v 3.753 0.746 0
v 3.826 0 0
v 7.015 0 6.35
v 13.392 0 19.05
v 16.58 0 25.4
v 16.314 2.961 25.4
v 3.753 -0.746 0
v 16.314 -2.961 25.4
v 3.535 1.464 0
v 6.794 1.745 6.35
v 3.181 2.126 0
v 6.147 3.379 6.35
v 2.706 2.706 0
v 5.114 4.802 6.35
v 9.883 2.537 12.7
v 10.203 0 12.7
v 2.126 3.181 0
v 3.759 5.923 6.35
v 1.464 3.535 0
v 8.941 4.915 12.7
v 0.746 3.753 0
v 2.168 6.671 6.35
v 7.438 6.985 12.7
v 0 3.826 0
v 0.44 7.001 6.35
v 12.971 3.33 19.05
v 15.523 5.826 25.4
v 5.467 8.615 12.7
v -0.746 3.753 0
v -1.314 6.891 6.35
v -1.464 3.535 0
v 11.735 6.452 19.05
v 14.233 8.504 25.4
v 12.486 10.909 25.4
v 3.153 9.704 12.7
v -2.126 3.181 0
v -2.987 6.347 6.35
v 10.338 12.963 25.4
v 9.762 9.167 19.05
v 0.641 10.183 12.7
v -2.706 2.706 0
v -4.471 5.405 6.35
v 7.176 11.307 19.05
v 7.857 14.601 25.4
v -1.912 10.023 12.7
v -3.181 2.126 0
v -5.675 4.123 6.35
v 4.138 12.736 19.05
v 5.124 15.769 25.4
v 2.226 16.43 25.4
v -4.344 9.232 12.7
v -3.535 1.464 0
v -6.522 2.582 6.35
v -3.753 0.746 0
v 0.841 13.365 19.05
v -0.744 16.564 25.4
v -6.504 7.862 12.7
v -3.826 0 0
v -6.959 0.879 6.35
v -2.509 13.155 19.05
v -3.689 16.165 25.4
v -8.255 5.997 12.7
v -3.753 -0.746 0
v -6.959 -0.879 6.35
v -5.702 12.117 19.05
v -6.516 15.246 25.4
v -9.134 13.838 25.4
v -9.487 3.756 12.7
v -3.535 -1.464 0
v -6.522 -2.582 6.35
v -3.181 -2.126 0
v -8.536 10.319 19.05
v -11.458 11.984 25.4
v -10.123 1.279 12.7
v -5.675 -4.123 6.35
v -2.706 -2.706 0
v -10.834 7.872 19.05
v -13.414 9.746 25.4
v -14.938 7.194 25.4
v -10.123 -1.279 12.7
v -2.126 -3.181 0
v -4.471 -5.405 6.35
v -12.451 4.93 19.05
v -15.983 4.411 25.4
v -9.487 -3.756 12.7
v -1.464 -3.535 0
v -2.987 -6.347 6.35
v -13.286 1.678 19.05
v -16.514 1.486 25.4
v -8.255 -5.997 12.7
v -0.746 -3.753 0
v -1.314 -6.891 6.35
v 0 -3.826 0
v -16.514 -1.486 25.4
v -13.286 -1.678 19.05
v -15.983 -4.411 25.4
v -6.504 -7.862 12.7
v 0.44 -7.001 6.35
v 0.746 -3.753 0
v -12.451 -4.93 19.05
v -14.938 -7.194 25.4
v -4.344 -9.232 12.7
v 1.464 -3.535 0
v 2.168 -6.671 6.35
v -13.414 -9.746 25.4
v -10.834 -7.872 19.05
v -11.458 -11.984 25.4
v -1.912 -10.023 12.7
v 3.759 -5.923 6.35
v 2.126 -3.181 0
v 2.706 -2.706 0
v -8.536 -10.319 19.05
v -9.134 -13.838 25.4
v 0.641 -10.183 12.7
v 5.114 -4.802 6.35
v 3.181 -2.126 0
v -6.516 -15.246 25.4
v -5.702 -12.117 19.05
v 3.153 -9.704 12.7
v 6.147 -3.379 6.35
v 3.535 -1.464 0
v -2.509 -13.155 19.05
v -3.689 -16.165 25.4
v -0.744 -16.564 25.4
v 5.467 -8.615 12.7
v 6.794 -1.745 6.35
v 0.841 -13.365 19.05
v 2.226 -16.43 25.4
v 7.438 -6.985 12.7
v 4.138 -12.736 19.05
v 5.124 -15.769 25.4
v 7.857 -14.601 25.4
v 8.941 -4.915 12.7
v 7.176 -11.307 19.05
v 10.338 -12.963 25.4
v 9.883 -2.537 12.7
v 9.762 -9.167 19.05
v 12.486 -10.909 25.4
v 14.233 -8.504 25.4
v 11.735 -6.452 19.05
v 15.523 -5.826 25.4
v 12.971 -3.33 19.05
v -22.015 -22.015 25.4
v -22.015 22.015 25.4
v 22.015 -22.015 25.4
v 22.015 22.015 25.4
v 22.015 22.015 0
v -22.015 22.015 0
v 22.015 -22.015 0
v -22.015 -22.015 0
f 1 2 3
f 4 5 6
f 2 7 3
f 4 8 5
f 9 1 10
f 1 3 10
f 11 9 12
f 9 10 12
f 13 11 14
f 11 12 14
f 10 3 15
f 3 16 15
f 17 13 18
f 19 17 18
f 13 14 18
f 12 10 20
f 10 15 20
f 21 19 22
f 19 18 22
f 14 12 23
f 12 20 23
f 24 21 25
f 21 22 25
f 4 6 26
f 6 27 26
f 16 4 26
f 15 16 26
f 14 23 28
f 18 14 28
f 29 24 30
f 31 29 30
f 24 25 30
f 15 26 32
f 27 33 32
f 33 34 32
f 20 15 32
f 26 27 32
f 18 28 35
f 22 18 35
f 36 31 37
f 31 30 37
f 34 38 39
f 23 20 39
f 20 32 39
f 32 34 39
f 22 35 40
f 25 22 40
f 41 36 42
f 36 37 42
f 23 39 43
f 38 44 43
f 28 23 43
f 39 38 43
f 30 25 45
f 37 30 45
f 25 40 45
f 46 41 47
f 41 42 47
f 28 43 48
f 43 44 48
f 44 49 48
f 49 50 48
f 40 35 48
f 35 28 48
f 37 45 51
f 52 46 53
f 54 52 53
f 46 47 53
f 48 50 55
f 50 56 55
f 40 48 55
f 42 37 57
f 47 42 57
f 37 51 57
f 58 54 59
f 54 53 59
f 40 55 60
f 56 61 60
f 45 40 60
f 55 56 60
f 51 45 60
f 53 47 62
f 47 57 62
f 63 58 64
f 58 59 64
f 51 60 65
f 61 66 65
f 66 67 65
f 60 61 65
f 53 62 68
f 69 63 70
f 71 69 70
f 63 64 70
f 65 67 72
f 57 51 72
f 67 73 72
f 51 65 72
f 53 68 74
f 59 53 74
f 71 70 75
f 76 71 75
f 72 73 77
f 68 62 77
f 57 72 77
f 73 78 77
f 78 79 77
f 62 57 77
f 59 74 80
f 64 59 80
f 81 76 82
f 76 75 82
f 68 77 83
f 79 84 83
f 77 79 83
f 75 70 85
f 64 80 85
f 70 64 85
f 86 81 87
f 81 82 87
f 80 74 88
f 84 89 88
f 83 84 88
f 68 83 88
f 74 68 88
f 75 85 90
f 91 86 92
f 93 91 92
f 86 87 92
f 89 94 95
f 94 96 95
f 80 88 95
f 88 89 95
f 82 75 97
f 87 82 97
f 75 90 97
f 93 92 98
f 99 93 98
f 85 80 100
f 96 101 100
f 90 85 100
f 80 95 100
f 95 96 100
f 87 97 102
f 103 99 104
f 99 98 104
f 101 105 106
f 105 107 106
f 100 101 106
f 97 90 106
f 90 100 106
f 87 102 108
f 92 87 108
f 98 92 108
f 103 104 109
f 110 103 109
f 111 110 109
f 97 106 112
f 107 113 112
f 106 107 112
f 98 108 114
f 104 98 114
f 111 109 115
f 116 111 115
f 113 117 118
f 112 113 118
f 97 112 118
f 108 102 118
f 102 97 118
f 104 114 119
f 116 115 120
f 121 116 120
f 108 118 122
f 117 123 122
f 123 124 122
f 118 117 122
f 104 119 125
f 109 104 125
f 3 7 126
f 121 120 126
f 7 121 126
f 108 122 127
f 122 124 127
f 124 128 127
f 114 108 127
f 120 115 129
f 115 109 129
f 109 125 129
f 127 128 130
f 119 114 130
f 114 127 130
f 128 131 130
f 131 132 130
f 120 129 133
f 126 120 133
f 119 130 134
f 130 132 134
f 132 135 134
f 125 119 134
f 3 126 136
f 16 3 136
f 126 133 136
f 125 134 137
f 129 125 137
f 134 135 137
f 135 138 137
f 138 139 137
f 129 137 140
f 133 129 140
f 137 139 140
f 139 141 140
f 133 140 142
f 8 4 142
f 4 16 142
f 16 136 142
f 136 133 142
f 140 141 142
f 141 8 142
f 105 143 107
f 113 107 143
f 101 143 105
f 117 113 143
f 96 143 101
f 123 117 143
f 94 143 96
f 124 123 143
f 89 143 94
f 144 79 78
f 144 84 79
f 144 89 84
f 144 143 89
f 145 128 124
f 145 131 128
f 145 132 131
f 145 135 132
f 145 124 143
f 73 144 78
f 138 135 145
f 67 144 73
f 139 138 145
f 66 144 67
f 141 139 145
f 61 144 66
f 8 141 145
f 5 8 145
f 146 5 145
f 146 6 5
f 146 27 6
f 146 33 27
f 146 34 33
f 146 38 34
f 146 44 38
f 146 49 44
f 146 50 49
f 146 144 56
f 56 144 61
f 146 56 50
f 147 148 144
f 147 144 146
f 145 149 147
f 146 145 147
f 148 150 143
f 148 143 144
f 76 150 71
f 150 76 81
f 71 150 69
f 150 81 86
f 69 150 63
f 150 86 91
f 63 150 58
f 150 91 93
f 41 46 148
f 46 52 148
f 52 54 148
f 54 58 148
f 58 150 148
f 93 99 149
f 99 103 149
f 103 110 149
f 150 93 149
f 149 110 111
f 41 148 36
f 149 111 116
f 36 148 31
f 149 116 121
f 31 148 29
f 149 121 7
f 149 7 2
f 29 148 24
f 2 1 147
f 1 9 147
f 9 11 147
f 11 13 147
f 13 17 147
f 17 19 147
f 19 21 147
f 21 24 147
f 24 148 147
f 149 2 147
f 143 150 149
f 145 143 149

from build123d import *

# Parameters (mm, degrees)
F0_W     = 44.030744
F0_H     = 44.030744
F1_DEPTH = 25.4


with BuildPart() as f1:
    # F0 (on Top) → F1 (new body)
    with BuildSketch(Plane.XY):
        Rectangle(F0_W, F0_H)
    extrude(amount=F1_DEPTH)


with BuildPart() as f3:
    # F2 (on Front) → F3 (revolve)
    with BuildSketch(Plane.XZ):
        Polygon((19.131194, 30.48), (0, 30.48), (0, -7.62), align=None)
    revolve(axis=Axis((0, 0, 11.43), (0, 0, 1)))


with BuildPart() as f1_1:
    add(f1.part)

    # F4: cut F3
    add(f3.part, mode=Mode.SUBTRACT)


solid = f1_1.part
